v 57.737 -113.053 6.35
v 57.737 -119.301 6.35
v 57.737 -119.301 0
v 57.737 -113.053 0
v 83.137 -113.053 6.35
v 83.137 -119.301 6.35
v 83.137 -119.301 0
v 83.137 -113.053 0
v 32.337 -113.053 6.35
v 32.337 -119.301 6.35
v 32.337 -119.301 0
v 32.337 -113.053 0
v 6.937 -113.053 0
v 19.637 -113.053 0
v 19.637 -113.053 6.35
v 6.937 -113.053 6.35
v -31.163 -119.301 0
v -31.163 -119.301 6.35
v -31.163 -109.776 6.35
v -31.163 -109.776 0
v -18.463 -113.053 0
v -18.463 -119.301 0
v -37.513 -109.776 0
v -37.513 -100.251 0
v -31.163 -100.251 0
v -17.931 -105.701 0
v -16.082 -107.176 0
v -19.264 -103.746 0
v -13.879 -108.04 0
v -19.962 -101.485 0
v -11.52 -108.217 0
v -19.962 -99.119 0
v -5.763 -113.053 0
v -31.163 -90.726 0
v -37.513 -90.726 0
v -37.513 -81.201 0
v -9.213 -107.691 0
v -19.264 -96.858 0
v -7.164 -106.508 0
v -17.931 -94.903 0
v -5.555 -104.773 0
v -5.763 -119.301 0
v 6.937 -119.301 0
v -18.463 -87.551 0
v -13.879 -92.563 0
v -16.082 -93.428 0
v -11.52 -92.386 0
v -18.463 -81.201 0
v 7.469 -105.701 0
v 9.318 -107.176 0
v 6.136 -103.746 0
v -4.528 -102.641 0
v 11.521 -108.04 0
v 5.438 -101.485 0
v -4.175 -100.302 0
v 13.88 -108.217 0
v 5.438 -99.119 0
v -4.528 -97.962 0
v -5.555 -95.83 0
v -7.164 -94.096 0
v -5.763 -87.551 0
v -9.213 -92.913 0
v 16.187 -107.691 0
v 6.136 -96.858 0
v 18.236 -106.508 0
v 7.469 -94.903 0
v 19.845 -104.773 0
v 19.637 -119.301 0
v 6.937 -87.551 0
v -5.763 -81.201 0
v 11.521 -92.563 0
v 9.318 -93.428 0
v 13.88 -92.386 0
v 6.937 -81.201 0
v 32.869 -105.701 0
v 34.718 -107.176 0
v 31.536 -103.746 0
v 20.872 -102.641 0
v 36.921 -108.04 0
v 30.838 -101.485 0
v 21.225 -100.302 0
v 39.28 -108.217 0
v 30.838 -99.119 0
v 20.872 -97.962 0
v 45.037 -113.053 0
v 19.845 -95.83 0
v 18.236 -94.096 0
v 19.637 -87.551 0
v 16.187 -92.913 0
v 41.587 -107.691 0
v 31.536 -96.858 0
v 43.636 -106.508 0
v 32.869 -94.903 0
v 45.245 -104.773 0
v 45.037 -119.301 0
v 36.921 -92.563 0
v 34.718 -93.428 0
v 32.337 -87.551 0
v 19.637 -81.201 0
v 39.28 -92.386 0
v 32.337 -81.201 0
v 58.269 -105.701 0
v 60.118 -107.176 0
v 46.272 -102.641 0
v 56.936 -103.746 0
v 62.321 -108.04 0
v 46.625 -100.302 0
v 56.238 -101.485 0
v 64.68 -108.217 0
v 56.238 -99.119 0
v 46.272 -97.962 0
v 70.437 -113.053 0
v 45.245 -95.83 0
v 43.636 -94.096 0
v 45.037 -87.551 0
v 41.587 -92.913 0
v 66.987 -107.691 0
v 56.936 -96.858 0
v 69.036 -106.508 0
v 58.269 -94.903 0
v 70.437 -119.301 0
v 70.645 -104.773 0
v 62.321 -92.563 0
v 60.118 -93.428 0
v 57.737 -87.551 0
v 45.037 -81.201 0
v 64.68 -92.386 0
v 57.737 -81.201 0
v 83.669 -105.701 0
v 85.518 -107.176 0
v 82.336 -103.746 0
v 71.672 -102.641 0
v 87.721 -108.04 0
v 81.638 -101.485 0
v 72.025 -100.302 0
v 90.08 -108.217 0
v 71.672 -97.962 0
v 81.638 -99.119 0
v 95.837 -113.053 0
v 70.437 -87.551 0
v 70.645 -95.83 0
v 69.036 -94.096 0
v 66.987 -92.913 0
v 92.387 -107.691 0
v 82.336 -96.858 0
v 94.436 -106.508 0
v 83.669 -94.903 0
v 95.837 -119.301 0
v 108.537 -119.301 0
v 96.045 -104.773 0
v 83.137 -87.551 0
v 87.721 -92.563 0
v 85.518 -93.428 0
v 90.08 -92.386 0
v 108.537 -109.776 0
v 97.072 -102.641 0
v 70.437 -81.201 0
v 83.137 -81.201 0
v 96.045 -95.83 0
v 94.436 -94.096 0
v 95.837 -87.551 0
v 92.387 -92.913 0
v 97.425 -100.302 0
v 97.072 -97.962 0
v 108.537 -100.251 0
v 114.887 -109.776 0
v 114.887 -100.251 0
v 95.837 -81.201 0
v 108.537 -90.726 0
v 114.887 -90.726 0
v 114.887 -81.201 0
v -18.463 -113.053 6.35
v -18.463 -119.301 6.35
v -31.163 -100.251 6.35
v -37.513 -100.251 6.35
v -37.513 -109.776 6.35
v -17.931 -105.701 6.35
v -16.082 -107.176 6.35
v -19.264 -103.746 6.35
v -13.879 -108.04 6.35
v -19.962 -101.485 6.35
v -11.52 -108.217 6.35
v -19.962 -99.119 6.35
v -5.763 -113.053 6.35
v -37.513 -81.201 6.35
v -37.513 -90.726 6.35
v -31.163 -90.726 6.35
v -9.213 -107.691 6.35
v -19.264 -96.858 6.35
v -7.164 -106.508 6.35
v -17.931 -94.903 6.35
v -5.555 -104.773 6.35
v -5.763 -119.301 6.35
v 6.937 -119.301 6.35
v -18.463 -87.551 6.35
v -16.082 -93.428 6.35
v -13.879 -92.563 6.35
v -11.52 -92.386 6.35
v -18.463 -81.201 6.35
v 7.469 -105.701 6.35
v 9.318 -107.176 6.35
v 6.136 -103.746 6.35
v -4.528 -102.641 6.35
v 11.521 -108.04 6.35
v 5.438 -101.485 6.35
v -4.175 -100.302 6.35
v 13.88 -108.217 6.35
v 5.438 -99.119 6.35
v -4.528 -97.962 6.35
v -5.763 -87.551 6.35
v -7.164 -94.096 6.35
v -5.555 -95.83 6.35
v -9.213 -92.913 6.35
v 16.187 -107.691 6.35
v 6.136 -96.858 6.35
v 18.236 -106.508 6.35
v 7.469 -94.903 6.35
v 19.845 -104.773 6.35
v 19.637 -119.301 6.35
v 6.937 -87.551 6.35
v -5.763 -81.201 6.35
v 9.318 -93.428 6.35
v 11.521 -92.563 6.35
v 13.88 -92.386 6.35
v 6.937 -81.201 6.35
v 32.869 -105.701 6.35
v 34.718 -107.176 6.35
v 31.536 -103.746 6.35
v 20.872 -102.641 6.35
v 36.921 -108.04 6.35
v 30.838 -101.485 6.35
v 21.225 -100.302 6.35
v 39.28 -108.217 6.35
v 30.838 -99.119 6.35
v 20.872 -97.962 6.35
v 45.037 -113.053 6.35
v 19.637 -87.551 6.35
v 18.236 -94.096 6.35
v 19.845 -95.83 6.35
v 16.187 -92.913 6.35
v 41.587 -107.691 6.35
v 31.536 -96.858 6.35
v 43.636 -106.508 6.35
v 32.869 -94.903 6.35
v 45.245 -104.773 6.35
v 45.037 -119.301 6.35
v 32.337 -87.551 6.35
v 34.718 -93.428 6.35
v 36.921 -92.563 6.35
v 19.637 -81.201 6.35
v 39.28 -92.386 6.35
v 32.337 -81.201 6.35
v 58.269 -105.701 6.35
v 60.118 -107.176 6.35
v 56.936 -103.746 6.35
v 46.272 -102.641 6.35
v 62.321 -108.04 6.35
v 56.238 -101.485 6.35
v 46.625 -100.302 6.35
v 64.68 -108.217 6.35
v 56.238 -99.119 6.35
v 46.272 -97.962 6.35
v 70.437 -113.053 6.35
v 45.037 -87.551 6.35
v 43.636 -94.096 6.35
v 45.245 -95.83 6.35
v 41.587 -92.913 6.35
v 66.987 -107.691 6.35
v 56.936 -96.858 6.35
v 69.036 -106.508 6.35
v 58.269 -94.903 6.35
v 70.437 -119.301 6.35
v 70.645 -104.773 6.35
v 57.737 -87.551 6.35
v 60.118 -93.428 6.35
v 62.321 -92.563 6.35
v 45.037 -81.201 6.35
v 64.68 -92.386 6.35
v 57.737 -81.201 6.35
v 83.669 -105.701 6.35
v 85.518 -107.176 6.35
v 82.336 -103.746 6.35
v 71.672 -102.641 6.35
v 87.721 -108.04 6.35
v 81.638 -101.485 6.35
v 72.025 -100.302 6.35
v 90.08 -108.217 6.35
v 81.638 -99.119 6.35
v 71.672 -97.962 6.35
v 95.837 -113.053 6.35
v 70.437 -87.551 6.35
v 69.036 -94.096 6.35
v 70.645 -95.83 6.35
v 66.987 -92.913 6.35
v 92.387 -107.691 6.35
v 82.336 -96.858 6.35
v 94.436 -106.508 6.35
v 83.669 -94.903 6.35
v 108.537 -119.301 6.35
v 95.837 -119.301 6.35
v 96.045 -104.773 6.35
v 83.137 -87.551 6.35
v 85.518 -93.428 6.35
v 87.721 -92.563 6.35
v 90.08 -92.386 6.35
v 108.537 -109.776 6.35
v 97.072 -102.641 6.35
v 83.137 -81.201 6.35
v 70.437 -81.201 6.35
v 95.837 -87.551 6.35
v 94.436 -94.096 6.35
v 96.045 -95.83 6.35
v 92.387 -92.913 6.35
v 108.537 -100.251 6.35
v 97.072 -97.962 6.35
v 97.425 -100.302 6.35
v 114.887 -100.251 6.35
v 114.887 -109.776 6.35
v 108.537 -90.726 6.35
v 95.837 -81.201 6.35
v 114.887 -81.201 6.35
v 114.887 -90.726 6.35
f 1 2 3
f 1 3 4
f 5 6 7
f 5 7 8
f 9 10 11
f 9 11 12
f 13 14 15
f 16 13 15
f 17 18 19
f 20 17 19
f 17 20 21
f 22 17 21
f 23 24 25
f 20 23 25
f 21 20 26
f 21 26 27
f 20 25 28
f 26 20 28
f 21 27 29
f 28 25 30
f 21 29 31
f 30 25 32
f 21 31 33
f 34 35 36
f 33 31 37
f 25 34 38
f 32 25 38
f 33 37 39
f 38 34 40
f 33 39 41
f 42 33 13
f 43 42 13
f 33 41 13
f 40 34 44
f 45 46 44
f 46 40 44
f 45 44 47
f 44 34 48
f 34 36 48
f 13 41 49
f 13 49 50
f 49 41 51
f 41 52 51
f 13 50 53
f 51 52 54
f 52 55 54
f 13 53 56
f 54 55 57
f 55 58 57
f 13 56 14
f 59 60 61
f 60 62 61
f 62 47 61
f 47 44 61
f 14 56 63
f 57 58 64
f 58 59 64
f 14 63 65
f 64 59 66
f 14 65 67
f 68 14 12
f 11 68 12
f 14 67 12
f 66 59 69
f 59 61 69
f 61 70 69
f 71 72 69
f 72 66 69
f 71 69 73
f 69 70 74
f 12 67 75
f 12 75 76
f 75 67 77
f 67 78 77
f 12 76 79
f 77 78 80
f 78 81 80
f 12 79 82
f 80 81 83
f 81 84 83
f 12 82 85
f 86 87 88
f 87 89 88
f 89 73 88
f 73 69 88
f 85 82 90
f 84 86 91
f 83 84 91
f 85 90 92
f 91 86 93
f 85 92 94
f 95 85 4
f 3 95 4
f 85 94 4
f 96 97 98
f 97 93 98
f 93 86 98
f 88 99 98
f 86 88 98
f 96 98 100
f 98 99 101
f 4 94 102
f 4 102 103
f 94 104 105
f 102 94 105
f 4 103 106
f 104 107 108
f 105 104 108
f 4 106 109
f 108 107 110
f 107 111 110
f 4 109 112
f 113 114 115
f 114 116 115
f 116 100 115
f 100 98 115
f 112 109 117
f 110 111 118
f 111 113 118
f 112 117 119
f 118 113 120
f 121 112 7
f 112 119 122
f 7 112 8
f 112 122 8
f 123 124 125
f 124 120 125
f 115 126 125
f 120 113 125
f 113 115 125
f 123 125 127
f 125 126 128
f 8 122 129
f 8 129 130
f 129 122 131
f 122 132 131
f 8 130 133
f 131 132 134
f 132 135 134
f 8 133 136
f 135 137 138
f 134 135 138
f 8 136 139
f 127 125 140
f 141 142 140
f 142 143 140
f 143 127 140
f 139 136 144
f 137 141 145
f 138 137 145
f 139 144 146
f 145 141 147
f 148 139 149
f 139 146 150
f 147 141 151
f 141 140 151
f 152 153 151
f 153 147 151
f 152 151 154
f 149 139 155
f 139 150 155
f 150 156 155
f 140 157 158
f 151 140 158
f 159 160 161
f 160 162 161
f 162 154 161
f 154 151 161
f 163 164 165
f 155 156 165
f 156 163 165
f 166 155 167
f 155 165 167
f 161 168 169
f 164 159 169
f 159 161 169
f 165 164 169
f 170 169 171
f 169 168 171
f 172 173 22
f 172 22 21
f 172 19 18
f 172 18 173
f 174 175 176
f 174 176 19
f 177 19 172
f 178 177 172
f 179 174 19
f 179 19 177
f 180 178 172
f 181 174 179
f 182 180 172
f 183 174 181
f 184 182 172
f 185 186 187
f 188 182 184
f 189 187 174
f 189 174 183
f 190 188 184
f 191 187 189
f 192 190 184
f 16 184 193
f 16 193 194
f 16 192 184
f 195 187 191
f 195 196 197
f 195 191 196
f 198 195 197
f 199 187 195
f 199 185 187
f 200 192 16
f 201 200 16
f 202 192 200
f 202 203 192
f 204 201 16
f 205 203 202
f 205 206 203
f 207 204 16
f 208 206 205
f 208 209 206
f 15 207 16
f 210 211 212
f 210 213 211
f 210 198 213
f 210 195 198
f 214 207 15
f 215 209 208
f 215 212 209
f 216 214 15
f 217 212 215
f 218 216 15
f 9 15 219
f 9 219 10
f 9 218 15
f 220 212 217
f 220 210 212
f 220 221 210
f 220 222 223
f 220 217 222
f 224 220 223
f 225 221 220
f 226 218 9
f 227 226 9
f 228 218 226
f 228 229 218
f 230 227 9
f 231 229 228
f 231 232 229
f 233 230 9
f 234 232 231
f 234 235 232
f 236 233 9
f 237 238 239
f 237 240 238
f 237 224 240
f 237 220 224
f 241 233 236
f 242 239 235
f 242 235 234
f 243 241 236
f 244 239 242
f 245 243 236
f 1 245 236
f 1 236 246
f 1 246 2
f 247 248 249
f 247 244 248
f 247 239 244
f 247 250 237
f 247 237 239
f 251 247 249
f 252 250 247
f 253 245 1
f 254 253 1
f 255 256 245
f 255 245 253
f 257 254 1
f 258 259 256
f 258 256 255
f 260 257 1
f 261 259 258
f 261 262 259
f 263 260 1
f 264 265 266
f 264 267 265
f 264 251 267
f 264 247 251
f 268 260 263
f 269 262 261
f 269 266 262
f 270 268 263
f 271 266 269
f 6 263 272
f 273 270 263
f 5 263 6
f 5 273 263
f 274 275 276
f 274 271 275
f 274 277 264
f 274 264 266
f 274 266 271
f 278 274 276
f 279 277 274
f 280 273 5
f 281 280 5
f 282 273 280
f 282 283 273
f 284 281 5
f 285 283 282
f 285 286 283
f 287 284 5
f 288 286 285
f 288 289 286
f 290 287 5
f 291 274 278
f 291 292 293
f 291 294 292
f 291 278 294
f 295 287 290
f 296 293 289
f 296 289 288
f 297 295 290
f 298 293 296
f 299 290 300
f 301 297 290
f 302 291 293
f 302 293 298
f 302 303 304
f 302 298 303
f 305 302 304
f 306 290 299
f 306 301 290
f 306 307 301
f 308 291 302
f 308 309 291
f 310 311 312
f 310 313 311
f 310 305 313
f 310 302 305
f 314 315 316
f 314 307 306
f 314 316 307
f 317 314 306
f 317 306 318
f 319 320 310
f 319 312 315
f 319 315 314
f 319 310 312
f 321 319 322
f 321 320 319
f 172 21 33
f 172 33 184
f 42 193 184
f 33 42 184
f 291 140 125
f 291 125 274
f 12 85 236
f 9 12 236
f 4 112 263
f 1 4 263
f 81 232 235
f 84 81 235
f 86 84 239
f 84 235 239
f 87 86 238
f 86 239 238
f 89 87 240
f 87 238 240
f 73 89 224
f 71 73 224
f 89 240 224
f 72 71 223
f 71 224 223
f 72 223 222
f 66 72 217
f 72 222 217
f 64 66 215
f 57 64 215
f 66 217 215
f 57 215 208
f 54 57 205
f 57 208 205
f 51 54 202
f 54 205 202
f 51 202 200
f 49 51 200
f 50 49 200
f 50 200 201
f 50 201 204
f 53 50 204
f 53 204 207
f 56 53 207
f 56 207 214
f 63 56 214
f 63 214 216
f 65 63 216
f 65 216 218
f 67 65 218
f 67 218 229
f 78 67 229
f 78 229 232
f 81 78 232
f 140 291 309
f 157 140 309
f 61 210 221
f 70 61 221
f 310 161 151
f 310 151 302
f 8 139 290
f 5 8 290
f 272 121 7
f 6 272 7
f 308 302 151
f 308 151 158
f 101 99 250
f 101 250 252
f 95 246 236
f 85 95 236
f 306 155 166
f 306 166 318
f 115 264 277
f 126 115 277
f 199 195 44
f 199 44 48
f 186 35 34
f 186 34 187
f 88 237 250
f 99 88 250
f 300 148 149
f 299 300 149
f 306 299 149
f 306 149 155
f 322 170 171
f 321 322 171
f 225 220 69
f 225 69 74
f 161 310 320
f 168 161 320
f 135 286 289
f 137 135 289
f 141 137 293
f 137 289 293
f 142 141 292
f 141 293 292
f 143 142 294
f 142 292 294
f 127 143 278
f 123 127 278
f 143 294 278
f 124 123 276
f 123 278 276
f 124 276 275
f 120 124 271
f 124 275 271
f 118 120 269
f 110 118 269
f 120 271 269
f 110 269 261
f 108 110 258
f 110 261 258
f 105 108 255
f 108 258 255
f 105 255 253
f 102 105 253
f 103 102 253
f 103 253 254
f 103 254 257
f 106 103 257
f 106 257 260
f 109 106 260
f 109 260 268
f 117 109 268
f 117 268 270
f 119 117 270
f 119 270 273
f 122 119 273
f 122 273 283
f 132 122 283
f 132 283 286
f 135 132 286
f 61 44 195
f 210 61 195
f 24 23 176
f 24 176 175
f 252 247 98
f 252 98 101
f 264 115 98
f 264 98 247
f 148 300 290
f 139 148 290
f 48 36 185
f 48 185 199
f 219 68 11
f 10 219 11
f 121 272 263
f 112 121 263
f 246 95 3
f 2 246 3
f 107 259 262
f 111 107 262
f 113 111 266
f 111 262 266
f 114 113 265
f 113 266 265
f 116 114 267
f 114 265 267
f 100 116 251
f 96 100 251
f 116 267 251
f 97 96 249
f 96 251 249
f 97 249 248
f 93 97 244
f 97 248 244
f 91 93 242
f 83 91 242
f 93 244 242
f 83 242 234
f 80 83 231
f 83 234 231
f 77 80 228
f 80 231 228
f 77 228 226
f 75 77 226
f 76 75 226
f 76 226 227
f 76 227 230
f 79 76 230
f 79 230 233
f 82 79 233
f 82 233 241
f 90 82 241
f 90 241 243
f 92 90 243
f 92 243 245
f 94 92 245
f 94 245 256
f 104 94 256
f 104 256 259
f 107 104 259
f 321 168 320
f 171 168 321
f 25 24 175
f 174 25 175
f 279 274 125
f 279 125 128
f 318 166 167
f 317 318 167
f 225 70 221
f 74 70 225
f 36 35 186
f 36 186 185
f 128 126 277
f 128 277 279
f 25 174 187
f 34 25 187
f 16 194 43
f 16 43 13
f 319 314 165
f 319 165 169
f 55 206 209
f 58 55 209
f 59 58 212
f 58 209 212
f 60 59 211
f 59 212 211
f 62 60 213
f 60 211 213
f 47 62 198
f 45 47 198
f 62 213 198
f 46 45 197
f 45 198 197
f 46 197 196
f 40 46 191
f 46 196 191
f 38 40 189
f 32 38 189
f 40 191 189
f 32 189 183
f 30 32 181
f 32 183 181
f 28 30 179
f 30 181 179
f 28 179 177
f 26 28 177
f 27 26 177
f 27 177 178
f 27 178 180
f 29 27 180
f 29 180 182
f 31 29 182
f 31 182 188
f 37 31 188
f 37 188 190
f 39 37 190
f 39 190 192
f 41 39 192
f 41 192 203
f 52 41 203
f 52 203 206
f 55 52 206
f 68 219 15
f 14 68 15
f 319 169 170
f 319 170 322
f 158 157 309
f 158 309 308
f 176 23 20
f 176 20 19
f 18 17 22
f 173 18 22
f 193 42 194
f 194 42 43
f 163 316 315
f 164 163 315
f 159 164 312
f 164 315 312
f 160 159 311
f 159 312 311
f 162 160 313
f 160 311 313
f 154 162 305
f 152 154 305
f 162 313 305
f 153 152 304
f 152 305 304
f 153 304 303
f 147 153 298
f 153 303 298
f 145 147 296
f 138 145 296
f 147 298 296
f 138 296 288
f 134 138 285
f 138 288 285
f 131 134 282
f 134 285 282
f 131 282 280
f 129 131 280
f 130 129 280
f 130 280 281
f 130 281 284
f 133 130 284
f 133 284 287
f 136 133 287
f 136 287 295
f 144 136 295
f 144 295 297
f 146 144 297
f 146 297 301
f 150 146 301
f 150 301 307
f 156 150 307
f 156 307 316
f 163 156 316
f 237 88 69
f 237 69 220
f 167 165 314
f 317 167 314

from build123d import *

# Parameters (mm, degrees)
SKETCH1_W             = 152.4
SKETCH1_H             = 38.1
BOSS_EXTRUDE1_DEPTH   = 6.35
CAVITY1_START         = -18.462835622
CAVITY1_OUTLINE_W     = 6.35
CAVITY1_OUTLINE_H     = 6.35
CAVITY1_OUTLINE_W_2   = 6.2484
CAVITY1_DEPTH         = 12.7
CAVITY1_START_2       = 6.937164378
CAVITY1_2_OUTLINE_W   = 6.35
CAVITY1_2_OUTLINE_H   = 6.35
CAVITY1_2_OUTLINE_W_2 = 6.2484
CAVITY1_2_DEPTH       = 12.7
CAVITY1_START_3       = 32.337164378
CAVITY1_3_OUTLINE_W   = 6.35
CAVITY1_3_OUTLINE_H   = 6.35
CAVITY1_3_OUTLINE_W_2 = 6.2484
CAVITY1_3_DEPTH       = 12.7
CAVITY1_START_4       = 57.737164378
CAVITY1_4_OUTLINE_W   = 6.35
CAVITY1_4_OUTLINE_H   = 6.35
CAVITY1_4_OUTLINE_W_2 = 6.2484
CAVITY1_4_DEPTH       = 12.7
CAVITY1_START_5       = 83.137164378
CAVITY1_5_OUTLINE_W   = 6.35
CAVITY1_5_OUTLINE_H   = 6.35
CAVITY1_5_OUTLINE_W_2 = 6.2484
CAVITY1_5_DEPTH       = 12.7
CAVITY1_START_6       = -37.512835622
CAVITY1_6_OUTLINE_W   = 9.525
CAVITY1_6_OUTLINE_H   = 6.35
CAVITY1_6_DEPTH       = 6.35
CAVITY1_START_7       = 108.537164378
CAVITY1_7_OUTLINE_W   = 9.525
CAVITY1_7_OUTLINE_H   = 6.35
CAVITY1_7_DEPTH       = 6.35
SKETCH2_R             = 7.9375
CUT_EXTRUDE1_DEPTH    = 166.74710148
LPATTERN1_COUNT       = 5
LPATTERN1_PITCH       = 25.4


# Read off the part's stored shape, not the designer's step: Cavity1
with BuildPart() as part:
    # Sketch1 → Boss-Extrude1 (new body)
    with BuildSketch(Plane.XY):
        with Locations((38.687164378, -100.250958128)):
            Rectangle(SKETCH1_W, SKETCH1_H)
    extrude(amount=BOSS_EXTRUDE1_DEPTH)

    # Cavity1 outline → Cavity1 (cut)
    with BuildSketch(Plane.YZ.offset(CAVITY1_START)):
        with Locations((-84.375958128, 3.175)):
            Rectangle(CAVITY1_OUTLINE_W, CAVITY1_OUTLINE_H)
        with Locations((-116.176758128, 3.175)):
            Rectangle(CAVITY1_OUTLINE_W_2, CAVITY1_OUTLINE_H)
    extrude(amount=CAVITY1_DEPTH, mode=Mode.SUBTRACT)

    # Cavity1 2 outline → Cavity1 2 (cut)
    with BuildSketch(Plane.YZ.offset(CAVITY1_START_2)):
        with Locations((-84.375958128, 3.175)):
            Rectangle(CAVITY1_2_OUTLINE_W, CAVITY1_2_OUTLINE_H)
        with Locations((-116.176758128, 3.175)):
            Rectangle(CAVITY1_2_OUTLINE_W_2, CAVITY1_2_OUTLINE_H)
    extrude(amount=CAVITY1_2_DEPTH, mode=Mode.SUBTRACT)

    # Cavity1 3 outline → Cavity1 3 (cut)
    with BuildSketch(Plane.YZ.offset(CAVITY1_START_3)):
        with Locations((-84.375958128, 3.175)):
            Rectangle(CAVITY1_3_OUTLINE_W, CAVITY1_3_OUTLINE_H)
        with Locations((-116.176758128, 3.175)):
            Rectangle(CAVITY1_3_OUTLINE_W_2, CAVITY1_3_OUTLINE_H)
    extrude(amount=CAVITY1_3_DEPTH, mode=Mode.SUBTRACT)

    # Cavity1 4 outline → Cavity1 4 (cut)
    with BuildSketch(Plane.YZ.offset(CAVITY1_START_4)):
        with Locations((-84.375958128, 3.175)):
            Rectangle(CAVITY1_4_OUTLINE_W, CAVITY1_4_OUTLINE_H)
        with Locations((-116.176758128, 3.175)):
            Rectangle(CAVITY1_4_OUTLINE_W_2, CAVITY1_4_OUTLINE_H)
    extrude(amount=CAVITY1_4_DEPTH, mode=Mode.SUBTRACT)

    # Cavity1 5 outline → Cavity1 5 (cut)
    with BuildSketch(Plane.YZ.offset(CAVITY1_START_5)):
        with Locations((-84.375958128, 3.175)):
            Rectangle(CAVITY1_5_OUTLINE_W, CAVITY1_5_OUTLINE_H)
        with Locations((-116.176758128, 3.175)):
            Rectangle(CAVITY1_5_OUTLINE_W_2, CAVITY1_5_OUTLINE_H)
    extrude(amount=CAVITY1_5_DEPTH, mode=Mode.SUBTRACT)

    # Cavity1 6 outline → Cavity1 6 (cut)
    with BuildSketch(Plane.YZ.offset(CAVITY1_START_6)):
        with Locations((-95.488458128, 3.175)):
            Rectangle(CAVITY1_6_OUTLINE_W, CAVITY1_6_OUTLINE_H)
        with Locations((-114.538458128, 3.175)):
            Rectangle(CAVITY1_6_OUTLINE_W, CAVITY1_6_OUTLINE_H)
    extrude(amount=CAVITY1_6_DEPTH, mode=Mode.SUBTRACT)

    # Cavity1 7 outline → Cavity1 7 (cut)
    with BuildSketch(Plane.YZ.offset(CAVITY1_START_7)):
        with Locations((-95.488458128, 3.175)):
            Rectangle(CAVITY1_7_OUTLINE_W, CAVITY1_7_OUTLINE_H)
        with Locations((-114.538458128, 3.175)):
            Rectangle(CAVITY1_7_OUTLINE_W, CAVITY1_7_OUTLINE_H)
    extrude(amount=CAVITY1_7_DEPTH, mode=Mode.SUBTRACT)

    # Sketch2 → Cut-Extrude1 (cut, through all)
    with BuildSketch(Plane.XY.offset(6.35)):
        with Locations((-12.112835622, -100.301758128)):
            Circle(SKETCH2_R)
    cut_extrude1 = extrude(amount=-CUT_EXTRUDE1_DEPTH, mode=Mode.SUBTRACT)

    # LPattern1: Cut-Extrude1 ×5
    with Locations(*[(i * LPATTERN1_PITCH, 0, 0) for i in range(1, LPATTERN1_COUNT)]):
        add(cut_extrude1, mode=Mode.SUBTRACT)


solid = part.part
